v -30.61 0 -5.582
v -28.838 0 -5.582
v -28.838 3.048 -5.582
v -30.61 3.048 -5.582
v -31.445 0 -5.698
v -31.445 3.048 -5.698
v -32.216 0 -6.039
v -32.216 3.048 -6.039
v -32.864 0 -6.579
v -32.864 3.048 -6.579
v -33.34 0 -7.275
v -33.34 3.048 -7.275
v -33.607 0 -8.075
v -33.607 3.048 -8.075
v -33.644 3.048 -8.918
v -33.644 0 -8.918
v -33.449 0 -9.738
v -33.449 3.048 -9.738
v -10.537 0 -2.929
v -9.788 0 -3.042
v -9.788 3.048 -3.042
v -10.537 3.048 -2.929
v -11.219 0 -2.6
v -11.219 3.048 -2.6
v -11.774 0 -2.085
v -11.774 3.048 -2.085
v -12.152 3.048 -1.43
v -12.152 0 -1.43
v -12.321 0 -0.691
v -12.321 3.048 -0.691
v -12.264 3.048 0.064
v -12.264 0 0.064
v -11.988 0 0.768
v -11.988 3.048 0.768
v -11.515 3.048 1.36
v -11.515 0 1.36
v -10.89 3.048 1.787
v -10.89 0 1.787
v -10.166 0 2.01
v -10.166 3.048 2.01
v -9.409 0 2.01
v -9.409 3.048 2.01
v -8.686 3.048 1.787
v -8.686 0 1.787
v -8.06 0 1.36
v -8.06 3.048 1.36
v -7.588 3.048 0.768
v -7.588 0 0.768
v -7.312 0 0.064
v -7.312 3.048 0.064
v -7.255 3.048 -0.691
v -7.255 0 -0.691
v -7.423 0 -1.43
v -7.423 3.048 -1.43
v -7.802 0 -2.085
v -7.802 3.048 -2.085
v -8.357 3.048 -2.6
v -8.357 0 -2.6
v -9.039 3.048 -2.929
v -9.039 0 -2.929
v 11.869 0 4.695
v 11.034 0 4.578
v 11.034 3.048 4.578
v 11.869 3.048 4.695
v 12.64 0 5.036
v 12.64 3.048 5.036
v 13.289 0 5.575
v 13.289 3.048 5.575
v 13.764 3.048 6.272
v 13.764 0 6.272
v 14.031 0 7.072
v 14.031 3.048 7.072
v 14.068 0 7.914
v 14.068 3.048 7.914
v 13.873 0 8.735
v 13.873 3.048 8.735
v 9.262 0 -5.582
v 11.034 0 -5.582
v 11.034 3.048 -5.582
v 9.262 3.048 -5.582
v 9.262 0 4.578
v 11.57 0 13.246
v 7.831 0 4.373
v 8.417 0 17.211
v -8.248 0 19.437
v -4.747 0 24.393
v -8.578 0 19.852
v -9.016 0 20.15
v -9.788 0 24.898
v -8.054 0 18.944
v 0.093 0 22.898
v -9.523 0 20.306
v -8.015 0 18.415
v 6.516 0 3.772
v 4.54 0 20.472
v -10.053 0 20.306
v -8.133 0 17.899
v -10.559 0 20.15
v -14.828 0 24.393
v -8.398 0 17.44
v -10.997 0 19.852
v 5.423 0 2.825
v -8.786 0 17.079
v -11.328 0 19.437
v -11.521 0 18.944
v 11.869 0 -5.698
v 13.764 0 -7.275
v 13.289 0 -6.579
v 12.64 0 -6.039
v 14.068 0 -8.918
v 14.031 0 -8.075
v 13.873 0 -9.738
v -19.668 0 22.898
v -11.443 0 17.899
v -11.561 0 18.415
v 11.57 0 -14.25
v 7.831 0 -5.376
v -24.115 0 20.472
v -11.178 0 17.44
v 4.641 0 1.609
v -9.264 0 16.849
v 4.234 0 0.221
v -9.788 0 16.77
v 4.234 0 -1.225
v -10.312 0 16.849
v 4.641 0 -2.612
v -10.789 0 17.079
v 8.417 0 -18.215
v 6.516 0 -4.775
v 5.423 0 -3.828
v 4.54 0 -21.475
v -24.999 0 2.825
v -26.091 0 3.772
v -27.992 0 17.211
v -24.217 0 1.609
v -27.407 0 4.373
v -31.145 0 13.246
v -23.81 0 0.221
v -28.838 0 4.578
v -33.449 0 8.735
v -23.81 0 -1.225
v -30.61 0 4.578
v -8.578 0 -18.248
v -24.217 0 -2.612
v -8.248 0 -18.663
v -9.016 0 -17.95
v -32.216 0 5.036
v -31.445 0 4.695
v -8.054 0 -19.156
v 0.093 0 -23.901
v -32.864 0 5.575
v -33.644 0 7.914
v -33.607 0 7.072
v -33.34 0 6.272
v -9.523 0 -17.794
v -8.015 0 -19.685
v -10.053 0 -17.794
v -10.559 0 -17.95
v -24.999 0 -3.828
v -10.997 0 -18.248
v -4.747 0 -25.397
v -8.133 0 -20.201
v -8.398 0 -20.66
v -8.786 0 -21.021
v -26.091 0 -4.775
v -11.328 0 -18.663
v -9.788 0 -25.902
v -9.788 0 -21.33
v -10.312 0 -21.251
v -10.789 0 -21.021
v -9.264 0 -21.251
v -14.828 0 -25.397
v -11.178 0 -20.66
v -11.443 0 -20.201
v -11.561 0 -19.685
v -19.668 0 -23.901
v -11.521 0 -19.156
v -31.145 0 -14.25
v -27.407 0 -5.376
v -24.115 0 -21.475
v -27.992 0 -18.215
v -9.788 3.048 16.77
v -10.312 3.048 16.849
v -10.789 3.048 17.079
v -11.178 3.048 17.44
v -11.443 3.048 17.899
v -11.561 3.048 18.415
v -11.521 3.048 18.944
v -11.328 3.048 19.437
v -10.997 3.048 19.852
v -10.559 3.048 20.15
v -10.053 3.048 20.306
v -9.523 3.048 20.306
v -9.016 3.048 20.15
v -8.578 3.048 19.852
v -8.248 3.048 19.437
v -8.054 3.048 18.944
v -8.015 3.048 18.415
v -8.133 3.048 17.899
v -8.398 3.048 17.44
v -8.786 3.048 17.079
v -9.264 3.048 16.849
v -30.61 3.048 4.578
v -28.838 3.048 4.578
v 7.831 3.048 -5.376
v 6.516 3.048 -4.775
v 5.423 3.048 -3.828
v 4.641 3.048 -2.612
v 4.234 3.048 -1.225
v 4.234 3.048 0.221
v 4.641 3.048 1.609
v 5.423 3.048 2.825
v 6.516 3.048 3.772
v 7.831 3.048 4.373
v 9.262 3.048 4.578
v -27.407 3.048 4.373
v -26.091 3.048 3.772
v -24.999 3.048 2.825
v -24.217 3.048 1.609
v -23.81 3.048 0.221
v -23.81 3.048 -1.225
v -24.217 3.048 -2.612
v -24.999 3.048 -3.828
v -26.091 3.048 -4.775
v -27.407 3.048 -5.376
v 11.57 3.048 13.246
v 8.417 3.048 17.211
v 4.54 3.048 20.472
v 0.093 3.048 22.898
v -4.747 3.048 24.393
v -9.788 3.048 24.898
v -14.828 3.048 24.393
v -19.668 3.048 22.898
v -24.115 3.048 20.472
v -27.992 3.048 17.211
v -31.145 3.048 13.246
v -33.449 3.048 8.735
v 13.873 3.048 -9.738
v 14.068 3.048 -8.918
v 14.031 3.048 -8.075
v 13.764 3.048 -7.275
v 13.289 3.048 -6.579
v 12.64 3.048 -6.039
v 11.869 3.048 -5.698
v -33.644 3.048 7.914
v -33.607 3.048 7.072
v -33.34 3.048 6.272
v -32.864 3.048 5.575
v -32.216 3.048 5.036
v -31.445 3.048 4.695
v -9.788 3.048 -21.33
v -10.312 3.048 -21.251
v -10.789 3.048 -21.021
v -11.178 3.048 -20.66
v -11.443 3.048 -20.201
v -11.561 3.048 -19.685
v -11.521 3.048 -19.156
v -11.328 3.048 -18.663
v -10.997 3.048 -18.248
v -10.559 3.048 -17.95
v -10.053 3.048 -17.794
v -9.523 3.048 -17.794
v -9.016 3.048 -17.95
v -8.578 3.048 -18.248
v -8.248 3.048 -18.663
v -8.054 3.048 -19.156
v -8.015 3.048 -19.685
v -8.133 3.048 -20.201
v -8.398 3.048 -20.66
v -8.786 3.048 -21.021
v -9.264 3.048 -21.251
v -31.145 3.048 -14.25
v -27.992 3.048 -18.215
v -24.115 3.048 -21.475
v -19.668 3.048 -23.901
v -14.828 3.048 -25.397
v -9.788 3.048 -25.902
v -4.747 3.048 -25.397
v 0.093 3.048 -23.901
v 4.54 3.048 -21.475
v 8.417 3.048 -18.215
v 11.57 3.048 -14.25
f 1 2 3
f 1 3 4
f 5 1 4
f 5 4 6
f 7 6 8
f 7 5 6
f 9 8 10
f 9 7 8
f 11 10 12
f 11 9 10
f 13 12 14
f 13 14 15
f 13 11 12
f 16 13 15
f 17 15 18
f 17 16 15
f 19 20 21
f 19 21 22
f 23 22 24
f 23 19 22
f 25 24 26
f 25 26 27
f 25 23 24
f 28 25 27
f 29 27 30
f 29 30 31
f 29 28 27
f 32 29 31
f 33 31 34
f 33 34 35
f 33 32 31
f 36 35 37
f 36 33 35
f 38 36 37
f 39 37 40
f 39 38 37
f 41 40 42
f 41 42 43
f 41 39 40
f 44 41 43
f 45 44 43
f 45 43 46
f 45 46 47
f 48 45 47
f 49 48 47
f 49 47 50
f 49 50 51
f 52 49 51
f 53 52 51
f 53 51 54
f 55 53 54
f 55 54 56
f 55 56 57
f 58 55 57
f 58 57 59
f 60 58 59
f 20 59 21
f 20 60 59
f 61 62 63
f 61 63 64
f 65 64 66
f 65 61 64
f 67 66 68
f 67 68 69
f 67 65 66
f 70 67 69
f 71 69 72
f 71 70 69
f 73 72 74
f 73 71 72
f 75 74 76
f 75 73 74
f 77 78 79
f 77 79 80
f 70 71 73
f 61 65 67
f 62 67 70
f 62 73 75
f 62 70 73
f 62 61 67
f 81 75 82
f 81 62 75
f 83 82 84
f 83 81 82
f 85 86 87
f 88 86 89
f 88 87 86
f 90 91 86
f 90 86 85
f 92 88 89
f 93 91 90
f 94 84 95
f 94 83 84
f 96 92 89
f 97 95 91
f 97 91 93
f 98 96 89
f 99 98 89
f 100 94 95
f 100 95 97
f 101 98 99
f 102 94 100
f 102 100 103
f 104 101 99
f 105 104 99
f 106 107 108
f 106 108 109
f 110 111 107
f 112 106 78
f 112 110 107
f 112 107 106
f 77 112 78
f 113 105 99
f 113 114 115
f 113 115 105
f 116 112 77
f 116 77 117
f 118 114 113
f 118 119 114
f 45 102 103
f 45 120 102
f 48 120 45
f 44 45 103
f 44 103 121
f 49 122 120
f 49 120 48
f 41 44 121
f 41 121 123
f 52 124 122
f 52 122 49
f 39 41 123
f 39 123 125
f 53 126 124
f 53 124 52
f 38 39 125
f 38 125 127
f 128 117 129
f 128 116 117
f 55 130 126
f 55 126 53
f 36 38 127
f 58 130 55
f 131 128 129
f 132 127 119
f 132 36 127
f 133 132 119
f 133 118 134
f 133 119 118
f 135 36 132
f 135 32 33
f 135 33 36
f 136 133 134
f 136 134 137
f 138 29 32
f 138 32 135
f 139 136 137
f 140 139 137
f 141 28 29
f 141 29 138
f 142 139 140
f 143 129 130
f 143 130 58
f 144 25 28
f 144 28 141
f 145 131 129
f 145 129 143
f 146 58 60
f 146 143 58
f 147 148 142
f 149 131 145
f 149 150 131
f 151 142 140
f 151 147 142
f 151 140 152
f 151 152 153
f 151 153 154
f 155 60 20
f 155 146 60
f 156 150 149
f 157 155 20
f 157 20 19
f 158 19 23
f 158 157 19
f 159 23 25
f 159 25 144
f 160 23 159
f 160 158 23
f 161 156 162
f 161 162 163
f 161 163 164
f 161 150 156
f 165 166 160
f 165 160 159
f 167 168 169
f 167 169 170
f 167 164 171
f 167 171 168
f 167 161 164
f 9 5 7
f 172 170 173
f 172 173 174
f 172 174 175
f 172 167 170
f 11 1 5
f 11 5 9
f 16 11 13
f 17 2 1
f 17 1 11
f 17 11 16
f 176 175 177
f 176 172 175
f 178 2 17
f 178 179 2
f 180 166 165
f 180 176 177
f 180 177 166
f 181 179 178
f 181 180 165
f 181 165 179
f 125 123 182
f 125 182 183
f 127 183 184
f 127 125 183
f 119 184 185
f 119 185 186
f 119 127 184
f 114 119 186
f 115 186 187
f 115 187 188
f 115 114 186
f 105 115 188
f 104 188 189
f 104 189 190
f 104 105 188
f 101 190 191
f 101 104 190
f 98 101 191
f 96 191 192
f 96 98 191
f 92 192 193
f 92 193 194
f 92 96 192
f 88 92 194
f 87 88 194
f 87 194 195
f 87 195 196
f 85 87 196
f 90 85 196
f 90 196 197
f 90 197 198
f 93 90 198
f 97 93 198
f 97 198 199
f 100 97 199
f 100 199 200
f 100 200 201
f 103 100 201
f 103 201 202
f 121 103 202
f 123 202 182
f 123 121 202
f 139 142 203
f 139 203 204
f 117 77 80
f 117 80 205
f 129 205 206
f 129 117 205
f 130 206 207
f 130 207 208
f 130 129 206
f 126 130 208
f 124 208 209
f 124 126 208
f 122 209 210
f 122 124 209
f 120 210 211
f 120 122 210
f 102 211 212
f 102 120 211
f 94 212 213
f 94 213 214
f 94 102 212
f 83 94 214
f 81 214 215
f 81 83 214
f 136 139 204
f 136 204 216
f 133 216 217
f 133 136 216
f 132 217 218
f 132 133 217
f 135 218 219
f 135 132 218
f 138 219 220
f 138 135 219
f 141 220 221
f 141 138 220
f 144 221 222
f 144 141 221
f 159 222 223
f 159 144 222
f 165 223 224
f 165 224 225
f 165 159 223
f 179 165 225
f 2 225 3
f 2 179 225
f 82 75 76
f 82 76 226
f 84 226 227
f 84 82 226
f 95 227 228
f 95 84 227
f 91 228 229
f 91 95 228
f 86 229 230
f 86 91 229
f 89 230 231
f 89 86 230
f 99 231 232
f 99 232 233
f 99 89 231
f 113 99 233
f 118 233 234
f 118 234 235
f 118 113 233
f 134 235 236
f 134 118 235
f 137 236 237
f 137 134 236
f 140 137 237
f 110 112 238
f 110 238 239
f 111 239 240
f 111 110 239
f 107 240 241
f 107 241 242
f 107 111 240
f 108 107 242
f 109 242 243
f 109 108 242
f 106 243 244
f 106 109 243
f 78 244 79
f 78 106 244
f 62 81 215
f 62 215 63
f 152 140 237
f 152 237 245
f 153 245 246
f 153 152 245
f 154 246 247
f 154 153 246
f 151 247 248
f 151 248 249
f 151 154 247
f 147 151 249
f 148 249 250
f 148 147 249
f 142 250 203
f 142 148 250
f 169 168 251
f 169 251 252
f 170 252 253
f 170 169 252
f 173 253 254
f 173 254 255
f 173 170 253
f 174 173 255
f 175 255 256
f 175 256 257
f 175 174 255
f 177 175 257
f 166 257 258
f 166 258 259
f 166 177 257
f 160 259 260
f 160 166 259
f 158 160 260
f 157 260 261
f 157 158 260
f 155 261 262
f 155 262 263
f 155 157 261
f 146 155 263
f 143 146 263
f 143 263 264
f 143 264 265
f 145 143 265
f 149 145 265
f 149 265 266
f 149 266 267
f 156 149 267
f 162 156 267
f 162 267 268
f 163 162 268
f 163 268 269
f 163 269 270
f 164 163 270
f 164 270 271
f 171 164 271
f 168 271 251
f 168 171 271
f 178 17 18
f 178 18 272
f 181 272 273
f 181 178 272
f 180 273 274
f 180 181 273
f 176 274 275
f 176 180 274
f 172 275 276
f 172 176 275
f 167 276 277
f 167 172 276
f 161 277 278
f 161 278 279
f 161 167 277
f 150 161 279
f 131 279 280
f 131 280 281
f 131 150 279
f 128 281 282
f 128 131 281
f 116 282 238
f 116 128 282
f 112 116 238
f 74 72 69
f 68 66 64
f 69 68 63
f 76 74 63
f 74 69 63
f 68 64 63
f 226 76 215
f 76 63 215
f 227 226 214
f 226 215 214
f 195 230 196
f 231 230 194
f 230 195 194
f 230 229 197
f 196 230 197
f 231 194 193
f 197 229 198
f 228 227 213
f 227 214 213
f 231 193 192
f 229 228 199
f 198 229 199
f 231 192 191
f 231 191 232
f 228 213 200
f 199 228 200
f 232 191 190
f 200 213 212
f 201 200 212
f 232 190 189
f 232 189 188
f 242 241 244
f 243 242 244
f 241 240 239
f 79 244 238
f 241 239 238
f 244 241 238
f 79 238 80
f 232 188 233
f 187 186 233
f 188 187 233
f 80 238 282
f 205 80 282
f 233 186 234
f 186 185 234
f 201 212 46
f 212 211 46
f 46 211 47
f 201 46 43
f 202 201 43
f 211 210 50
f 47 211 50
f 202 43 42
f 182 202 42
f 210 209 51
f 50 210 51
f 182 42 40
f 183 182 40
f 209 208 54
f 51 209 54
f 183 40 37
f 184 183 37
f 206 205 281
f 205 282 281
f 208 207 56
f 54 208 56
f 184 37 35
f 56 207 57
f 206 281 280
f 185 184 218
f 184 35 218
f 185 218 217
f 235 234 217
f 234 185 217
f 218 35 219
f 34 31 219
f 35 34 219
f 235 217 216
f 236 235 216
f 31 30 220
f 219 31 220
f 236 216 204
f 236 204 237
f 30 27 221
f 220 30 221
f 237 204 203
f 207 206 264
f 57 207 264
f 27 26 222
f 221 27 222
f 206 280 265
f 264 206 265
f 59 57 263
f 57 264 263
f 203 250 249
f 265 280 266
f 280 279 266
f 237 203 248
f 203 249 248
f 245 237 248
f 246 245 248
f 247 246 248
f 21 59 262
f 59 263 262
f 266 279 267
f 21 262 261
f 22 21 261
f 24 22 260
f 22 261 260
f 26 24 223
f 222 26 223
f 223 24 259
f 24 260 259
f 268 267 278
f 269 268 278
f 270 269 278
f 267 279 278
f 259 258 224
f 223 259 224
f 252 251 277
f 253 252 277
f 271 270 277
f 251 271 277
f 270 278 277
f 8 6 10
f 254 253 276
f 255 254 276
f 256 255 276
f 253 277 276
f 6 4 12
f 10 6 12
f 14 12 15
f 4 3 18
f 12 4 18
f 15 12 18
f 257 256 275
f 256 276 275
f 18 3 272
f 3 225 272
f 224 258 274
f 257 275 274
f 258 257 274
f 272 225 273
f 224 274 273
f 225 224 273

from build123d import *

# Parameters (mm, degrees)
SKETCH1_R           = 1.778
SKETCH1_R_2         = 2.54
BOSS_EXTRUDE1_DEPTH = 3.048


with BuildPart() as part:
    # Sketch1 → Boss-Extrude1 (new body)
    with BuildSketch(Plane(origin=(0, 0, 0), x_dir=(1, 0, 0), z_dir=(0, 1, 0))):
        with BuildLine():
            Line((-28.837830229, 5.581683581), (-30.609634186, 5.581683581))
            ThreePointArc((-30.609634186, 5.581683581), (-33.126437353, 6.910379705), (-33.448971089, 9.738047217))
            ThreePointArc((-33.448971089, 9.738047217), (-9.787830229, 25.901683581), (13.87331063, 9.738047217))
            ThreePointArc((13.87331063, 9.738047217), (13.550776894, 6.910379705), (11.033973727, 5.581683581))
            Line((11.033973727, 5.581683581), (9.262169771, 5.581683581))
            ThreePointArc((9.262169771, 5.581683581), (4.182169771, 0.501683581), (9.262169771, -4.578316419))
            Line((9.262169771, -4.578316419), (11.033973727, -4.578316419))
            ThreePointArc((11.033973727, -4.578316419), (13.550776894, -5.907012543), (13.87331063, -8.734680055))
            ThreePointArc((13.87331063, -8.734680055), (-9.787830229, -24.898316419), (-33.448971089, -8.734680055))
            ThreePointArc((-33.448971089, -8.734680055), (-33.126437353, -5.907012543), (-30.609634186, -4.578316419))
            Line((-30.609634186, -4.578316419), (-28.837830229, -4.578316419))
            ThreePointArc((-28.837830229, -4.578316419), (-23.757830229, 0.501683581), (-28.837830229, 5.581683581))
        make_face()
        with Locations(Location((-9.787830229, 19.551683581, 0), (0, 0, 90))):
            Circle(SKETCH1_R, mode=Mode.SUBTRACT)
        with Locations(Location((-9.787830229, -18.548316419, 0), (0, 0, 90))):
            Circle(SKETCH1_R, mode=Mode.SUBTRACT)
        with Locations(Location((-9.787830229, 0.501683581, 0), (0, 0, 90))):
            Circle(SKETCH1_R_2, mode=Mode.SUBTRACT)
    extrude(amount=BOSS_EXTRUDE1_DEPTH)


solid = part.part
